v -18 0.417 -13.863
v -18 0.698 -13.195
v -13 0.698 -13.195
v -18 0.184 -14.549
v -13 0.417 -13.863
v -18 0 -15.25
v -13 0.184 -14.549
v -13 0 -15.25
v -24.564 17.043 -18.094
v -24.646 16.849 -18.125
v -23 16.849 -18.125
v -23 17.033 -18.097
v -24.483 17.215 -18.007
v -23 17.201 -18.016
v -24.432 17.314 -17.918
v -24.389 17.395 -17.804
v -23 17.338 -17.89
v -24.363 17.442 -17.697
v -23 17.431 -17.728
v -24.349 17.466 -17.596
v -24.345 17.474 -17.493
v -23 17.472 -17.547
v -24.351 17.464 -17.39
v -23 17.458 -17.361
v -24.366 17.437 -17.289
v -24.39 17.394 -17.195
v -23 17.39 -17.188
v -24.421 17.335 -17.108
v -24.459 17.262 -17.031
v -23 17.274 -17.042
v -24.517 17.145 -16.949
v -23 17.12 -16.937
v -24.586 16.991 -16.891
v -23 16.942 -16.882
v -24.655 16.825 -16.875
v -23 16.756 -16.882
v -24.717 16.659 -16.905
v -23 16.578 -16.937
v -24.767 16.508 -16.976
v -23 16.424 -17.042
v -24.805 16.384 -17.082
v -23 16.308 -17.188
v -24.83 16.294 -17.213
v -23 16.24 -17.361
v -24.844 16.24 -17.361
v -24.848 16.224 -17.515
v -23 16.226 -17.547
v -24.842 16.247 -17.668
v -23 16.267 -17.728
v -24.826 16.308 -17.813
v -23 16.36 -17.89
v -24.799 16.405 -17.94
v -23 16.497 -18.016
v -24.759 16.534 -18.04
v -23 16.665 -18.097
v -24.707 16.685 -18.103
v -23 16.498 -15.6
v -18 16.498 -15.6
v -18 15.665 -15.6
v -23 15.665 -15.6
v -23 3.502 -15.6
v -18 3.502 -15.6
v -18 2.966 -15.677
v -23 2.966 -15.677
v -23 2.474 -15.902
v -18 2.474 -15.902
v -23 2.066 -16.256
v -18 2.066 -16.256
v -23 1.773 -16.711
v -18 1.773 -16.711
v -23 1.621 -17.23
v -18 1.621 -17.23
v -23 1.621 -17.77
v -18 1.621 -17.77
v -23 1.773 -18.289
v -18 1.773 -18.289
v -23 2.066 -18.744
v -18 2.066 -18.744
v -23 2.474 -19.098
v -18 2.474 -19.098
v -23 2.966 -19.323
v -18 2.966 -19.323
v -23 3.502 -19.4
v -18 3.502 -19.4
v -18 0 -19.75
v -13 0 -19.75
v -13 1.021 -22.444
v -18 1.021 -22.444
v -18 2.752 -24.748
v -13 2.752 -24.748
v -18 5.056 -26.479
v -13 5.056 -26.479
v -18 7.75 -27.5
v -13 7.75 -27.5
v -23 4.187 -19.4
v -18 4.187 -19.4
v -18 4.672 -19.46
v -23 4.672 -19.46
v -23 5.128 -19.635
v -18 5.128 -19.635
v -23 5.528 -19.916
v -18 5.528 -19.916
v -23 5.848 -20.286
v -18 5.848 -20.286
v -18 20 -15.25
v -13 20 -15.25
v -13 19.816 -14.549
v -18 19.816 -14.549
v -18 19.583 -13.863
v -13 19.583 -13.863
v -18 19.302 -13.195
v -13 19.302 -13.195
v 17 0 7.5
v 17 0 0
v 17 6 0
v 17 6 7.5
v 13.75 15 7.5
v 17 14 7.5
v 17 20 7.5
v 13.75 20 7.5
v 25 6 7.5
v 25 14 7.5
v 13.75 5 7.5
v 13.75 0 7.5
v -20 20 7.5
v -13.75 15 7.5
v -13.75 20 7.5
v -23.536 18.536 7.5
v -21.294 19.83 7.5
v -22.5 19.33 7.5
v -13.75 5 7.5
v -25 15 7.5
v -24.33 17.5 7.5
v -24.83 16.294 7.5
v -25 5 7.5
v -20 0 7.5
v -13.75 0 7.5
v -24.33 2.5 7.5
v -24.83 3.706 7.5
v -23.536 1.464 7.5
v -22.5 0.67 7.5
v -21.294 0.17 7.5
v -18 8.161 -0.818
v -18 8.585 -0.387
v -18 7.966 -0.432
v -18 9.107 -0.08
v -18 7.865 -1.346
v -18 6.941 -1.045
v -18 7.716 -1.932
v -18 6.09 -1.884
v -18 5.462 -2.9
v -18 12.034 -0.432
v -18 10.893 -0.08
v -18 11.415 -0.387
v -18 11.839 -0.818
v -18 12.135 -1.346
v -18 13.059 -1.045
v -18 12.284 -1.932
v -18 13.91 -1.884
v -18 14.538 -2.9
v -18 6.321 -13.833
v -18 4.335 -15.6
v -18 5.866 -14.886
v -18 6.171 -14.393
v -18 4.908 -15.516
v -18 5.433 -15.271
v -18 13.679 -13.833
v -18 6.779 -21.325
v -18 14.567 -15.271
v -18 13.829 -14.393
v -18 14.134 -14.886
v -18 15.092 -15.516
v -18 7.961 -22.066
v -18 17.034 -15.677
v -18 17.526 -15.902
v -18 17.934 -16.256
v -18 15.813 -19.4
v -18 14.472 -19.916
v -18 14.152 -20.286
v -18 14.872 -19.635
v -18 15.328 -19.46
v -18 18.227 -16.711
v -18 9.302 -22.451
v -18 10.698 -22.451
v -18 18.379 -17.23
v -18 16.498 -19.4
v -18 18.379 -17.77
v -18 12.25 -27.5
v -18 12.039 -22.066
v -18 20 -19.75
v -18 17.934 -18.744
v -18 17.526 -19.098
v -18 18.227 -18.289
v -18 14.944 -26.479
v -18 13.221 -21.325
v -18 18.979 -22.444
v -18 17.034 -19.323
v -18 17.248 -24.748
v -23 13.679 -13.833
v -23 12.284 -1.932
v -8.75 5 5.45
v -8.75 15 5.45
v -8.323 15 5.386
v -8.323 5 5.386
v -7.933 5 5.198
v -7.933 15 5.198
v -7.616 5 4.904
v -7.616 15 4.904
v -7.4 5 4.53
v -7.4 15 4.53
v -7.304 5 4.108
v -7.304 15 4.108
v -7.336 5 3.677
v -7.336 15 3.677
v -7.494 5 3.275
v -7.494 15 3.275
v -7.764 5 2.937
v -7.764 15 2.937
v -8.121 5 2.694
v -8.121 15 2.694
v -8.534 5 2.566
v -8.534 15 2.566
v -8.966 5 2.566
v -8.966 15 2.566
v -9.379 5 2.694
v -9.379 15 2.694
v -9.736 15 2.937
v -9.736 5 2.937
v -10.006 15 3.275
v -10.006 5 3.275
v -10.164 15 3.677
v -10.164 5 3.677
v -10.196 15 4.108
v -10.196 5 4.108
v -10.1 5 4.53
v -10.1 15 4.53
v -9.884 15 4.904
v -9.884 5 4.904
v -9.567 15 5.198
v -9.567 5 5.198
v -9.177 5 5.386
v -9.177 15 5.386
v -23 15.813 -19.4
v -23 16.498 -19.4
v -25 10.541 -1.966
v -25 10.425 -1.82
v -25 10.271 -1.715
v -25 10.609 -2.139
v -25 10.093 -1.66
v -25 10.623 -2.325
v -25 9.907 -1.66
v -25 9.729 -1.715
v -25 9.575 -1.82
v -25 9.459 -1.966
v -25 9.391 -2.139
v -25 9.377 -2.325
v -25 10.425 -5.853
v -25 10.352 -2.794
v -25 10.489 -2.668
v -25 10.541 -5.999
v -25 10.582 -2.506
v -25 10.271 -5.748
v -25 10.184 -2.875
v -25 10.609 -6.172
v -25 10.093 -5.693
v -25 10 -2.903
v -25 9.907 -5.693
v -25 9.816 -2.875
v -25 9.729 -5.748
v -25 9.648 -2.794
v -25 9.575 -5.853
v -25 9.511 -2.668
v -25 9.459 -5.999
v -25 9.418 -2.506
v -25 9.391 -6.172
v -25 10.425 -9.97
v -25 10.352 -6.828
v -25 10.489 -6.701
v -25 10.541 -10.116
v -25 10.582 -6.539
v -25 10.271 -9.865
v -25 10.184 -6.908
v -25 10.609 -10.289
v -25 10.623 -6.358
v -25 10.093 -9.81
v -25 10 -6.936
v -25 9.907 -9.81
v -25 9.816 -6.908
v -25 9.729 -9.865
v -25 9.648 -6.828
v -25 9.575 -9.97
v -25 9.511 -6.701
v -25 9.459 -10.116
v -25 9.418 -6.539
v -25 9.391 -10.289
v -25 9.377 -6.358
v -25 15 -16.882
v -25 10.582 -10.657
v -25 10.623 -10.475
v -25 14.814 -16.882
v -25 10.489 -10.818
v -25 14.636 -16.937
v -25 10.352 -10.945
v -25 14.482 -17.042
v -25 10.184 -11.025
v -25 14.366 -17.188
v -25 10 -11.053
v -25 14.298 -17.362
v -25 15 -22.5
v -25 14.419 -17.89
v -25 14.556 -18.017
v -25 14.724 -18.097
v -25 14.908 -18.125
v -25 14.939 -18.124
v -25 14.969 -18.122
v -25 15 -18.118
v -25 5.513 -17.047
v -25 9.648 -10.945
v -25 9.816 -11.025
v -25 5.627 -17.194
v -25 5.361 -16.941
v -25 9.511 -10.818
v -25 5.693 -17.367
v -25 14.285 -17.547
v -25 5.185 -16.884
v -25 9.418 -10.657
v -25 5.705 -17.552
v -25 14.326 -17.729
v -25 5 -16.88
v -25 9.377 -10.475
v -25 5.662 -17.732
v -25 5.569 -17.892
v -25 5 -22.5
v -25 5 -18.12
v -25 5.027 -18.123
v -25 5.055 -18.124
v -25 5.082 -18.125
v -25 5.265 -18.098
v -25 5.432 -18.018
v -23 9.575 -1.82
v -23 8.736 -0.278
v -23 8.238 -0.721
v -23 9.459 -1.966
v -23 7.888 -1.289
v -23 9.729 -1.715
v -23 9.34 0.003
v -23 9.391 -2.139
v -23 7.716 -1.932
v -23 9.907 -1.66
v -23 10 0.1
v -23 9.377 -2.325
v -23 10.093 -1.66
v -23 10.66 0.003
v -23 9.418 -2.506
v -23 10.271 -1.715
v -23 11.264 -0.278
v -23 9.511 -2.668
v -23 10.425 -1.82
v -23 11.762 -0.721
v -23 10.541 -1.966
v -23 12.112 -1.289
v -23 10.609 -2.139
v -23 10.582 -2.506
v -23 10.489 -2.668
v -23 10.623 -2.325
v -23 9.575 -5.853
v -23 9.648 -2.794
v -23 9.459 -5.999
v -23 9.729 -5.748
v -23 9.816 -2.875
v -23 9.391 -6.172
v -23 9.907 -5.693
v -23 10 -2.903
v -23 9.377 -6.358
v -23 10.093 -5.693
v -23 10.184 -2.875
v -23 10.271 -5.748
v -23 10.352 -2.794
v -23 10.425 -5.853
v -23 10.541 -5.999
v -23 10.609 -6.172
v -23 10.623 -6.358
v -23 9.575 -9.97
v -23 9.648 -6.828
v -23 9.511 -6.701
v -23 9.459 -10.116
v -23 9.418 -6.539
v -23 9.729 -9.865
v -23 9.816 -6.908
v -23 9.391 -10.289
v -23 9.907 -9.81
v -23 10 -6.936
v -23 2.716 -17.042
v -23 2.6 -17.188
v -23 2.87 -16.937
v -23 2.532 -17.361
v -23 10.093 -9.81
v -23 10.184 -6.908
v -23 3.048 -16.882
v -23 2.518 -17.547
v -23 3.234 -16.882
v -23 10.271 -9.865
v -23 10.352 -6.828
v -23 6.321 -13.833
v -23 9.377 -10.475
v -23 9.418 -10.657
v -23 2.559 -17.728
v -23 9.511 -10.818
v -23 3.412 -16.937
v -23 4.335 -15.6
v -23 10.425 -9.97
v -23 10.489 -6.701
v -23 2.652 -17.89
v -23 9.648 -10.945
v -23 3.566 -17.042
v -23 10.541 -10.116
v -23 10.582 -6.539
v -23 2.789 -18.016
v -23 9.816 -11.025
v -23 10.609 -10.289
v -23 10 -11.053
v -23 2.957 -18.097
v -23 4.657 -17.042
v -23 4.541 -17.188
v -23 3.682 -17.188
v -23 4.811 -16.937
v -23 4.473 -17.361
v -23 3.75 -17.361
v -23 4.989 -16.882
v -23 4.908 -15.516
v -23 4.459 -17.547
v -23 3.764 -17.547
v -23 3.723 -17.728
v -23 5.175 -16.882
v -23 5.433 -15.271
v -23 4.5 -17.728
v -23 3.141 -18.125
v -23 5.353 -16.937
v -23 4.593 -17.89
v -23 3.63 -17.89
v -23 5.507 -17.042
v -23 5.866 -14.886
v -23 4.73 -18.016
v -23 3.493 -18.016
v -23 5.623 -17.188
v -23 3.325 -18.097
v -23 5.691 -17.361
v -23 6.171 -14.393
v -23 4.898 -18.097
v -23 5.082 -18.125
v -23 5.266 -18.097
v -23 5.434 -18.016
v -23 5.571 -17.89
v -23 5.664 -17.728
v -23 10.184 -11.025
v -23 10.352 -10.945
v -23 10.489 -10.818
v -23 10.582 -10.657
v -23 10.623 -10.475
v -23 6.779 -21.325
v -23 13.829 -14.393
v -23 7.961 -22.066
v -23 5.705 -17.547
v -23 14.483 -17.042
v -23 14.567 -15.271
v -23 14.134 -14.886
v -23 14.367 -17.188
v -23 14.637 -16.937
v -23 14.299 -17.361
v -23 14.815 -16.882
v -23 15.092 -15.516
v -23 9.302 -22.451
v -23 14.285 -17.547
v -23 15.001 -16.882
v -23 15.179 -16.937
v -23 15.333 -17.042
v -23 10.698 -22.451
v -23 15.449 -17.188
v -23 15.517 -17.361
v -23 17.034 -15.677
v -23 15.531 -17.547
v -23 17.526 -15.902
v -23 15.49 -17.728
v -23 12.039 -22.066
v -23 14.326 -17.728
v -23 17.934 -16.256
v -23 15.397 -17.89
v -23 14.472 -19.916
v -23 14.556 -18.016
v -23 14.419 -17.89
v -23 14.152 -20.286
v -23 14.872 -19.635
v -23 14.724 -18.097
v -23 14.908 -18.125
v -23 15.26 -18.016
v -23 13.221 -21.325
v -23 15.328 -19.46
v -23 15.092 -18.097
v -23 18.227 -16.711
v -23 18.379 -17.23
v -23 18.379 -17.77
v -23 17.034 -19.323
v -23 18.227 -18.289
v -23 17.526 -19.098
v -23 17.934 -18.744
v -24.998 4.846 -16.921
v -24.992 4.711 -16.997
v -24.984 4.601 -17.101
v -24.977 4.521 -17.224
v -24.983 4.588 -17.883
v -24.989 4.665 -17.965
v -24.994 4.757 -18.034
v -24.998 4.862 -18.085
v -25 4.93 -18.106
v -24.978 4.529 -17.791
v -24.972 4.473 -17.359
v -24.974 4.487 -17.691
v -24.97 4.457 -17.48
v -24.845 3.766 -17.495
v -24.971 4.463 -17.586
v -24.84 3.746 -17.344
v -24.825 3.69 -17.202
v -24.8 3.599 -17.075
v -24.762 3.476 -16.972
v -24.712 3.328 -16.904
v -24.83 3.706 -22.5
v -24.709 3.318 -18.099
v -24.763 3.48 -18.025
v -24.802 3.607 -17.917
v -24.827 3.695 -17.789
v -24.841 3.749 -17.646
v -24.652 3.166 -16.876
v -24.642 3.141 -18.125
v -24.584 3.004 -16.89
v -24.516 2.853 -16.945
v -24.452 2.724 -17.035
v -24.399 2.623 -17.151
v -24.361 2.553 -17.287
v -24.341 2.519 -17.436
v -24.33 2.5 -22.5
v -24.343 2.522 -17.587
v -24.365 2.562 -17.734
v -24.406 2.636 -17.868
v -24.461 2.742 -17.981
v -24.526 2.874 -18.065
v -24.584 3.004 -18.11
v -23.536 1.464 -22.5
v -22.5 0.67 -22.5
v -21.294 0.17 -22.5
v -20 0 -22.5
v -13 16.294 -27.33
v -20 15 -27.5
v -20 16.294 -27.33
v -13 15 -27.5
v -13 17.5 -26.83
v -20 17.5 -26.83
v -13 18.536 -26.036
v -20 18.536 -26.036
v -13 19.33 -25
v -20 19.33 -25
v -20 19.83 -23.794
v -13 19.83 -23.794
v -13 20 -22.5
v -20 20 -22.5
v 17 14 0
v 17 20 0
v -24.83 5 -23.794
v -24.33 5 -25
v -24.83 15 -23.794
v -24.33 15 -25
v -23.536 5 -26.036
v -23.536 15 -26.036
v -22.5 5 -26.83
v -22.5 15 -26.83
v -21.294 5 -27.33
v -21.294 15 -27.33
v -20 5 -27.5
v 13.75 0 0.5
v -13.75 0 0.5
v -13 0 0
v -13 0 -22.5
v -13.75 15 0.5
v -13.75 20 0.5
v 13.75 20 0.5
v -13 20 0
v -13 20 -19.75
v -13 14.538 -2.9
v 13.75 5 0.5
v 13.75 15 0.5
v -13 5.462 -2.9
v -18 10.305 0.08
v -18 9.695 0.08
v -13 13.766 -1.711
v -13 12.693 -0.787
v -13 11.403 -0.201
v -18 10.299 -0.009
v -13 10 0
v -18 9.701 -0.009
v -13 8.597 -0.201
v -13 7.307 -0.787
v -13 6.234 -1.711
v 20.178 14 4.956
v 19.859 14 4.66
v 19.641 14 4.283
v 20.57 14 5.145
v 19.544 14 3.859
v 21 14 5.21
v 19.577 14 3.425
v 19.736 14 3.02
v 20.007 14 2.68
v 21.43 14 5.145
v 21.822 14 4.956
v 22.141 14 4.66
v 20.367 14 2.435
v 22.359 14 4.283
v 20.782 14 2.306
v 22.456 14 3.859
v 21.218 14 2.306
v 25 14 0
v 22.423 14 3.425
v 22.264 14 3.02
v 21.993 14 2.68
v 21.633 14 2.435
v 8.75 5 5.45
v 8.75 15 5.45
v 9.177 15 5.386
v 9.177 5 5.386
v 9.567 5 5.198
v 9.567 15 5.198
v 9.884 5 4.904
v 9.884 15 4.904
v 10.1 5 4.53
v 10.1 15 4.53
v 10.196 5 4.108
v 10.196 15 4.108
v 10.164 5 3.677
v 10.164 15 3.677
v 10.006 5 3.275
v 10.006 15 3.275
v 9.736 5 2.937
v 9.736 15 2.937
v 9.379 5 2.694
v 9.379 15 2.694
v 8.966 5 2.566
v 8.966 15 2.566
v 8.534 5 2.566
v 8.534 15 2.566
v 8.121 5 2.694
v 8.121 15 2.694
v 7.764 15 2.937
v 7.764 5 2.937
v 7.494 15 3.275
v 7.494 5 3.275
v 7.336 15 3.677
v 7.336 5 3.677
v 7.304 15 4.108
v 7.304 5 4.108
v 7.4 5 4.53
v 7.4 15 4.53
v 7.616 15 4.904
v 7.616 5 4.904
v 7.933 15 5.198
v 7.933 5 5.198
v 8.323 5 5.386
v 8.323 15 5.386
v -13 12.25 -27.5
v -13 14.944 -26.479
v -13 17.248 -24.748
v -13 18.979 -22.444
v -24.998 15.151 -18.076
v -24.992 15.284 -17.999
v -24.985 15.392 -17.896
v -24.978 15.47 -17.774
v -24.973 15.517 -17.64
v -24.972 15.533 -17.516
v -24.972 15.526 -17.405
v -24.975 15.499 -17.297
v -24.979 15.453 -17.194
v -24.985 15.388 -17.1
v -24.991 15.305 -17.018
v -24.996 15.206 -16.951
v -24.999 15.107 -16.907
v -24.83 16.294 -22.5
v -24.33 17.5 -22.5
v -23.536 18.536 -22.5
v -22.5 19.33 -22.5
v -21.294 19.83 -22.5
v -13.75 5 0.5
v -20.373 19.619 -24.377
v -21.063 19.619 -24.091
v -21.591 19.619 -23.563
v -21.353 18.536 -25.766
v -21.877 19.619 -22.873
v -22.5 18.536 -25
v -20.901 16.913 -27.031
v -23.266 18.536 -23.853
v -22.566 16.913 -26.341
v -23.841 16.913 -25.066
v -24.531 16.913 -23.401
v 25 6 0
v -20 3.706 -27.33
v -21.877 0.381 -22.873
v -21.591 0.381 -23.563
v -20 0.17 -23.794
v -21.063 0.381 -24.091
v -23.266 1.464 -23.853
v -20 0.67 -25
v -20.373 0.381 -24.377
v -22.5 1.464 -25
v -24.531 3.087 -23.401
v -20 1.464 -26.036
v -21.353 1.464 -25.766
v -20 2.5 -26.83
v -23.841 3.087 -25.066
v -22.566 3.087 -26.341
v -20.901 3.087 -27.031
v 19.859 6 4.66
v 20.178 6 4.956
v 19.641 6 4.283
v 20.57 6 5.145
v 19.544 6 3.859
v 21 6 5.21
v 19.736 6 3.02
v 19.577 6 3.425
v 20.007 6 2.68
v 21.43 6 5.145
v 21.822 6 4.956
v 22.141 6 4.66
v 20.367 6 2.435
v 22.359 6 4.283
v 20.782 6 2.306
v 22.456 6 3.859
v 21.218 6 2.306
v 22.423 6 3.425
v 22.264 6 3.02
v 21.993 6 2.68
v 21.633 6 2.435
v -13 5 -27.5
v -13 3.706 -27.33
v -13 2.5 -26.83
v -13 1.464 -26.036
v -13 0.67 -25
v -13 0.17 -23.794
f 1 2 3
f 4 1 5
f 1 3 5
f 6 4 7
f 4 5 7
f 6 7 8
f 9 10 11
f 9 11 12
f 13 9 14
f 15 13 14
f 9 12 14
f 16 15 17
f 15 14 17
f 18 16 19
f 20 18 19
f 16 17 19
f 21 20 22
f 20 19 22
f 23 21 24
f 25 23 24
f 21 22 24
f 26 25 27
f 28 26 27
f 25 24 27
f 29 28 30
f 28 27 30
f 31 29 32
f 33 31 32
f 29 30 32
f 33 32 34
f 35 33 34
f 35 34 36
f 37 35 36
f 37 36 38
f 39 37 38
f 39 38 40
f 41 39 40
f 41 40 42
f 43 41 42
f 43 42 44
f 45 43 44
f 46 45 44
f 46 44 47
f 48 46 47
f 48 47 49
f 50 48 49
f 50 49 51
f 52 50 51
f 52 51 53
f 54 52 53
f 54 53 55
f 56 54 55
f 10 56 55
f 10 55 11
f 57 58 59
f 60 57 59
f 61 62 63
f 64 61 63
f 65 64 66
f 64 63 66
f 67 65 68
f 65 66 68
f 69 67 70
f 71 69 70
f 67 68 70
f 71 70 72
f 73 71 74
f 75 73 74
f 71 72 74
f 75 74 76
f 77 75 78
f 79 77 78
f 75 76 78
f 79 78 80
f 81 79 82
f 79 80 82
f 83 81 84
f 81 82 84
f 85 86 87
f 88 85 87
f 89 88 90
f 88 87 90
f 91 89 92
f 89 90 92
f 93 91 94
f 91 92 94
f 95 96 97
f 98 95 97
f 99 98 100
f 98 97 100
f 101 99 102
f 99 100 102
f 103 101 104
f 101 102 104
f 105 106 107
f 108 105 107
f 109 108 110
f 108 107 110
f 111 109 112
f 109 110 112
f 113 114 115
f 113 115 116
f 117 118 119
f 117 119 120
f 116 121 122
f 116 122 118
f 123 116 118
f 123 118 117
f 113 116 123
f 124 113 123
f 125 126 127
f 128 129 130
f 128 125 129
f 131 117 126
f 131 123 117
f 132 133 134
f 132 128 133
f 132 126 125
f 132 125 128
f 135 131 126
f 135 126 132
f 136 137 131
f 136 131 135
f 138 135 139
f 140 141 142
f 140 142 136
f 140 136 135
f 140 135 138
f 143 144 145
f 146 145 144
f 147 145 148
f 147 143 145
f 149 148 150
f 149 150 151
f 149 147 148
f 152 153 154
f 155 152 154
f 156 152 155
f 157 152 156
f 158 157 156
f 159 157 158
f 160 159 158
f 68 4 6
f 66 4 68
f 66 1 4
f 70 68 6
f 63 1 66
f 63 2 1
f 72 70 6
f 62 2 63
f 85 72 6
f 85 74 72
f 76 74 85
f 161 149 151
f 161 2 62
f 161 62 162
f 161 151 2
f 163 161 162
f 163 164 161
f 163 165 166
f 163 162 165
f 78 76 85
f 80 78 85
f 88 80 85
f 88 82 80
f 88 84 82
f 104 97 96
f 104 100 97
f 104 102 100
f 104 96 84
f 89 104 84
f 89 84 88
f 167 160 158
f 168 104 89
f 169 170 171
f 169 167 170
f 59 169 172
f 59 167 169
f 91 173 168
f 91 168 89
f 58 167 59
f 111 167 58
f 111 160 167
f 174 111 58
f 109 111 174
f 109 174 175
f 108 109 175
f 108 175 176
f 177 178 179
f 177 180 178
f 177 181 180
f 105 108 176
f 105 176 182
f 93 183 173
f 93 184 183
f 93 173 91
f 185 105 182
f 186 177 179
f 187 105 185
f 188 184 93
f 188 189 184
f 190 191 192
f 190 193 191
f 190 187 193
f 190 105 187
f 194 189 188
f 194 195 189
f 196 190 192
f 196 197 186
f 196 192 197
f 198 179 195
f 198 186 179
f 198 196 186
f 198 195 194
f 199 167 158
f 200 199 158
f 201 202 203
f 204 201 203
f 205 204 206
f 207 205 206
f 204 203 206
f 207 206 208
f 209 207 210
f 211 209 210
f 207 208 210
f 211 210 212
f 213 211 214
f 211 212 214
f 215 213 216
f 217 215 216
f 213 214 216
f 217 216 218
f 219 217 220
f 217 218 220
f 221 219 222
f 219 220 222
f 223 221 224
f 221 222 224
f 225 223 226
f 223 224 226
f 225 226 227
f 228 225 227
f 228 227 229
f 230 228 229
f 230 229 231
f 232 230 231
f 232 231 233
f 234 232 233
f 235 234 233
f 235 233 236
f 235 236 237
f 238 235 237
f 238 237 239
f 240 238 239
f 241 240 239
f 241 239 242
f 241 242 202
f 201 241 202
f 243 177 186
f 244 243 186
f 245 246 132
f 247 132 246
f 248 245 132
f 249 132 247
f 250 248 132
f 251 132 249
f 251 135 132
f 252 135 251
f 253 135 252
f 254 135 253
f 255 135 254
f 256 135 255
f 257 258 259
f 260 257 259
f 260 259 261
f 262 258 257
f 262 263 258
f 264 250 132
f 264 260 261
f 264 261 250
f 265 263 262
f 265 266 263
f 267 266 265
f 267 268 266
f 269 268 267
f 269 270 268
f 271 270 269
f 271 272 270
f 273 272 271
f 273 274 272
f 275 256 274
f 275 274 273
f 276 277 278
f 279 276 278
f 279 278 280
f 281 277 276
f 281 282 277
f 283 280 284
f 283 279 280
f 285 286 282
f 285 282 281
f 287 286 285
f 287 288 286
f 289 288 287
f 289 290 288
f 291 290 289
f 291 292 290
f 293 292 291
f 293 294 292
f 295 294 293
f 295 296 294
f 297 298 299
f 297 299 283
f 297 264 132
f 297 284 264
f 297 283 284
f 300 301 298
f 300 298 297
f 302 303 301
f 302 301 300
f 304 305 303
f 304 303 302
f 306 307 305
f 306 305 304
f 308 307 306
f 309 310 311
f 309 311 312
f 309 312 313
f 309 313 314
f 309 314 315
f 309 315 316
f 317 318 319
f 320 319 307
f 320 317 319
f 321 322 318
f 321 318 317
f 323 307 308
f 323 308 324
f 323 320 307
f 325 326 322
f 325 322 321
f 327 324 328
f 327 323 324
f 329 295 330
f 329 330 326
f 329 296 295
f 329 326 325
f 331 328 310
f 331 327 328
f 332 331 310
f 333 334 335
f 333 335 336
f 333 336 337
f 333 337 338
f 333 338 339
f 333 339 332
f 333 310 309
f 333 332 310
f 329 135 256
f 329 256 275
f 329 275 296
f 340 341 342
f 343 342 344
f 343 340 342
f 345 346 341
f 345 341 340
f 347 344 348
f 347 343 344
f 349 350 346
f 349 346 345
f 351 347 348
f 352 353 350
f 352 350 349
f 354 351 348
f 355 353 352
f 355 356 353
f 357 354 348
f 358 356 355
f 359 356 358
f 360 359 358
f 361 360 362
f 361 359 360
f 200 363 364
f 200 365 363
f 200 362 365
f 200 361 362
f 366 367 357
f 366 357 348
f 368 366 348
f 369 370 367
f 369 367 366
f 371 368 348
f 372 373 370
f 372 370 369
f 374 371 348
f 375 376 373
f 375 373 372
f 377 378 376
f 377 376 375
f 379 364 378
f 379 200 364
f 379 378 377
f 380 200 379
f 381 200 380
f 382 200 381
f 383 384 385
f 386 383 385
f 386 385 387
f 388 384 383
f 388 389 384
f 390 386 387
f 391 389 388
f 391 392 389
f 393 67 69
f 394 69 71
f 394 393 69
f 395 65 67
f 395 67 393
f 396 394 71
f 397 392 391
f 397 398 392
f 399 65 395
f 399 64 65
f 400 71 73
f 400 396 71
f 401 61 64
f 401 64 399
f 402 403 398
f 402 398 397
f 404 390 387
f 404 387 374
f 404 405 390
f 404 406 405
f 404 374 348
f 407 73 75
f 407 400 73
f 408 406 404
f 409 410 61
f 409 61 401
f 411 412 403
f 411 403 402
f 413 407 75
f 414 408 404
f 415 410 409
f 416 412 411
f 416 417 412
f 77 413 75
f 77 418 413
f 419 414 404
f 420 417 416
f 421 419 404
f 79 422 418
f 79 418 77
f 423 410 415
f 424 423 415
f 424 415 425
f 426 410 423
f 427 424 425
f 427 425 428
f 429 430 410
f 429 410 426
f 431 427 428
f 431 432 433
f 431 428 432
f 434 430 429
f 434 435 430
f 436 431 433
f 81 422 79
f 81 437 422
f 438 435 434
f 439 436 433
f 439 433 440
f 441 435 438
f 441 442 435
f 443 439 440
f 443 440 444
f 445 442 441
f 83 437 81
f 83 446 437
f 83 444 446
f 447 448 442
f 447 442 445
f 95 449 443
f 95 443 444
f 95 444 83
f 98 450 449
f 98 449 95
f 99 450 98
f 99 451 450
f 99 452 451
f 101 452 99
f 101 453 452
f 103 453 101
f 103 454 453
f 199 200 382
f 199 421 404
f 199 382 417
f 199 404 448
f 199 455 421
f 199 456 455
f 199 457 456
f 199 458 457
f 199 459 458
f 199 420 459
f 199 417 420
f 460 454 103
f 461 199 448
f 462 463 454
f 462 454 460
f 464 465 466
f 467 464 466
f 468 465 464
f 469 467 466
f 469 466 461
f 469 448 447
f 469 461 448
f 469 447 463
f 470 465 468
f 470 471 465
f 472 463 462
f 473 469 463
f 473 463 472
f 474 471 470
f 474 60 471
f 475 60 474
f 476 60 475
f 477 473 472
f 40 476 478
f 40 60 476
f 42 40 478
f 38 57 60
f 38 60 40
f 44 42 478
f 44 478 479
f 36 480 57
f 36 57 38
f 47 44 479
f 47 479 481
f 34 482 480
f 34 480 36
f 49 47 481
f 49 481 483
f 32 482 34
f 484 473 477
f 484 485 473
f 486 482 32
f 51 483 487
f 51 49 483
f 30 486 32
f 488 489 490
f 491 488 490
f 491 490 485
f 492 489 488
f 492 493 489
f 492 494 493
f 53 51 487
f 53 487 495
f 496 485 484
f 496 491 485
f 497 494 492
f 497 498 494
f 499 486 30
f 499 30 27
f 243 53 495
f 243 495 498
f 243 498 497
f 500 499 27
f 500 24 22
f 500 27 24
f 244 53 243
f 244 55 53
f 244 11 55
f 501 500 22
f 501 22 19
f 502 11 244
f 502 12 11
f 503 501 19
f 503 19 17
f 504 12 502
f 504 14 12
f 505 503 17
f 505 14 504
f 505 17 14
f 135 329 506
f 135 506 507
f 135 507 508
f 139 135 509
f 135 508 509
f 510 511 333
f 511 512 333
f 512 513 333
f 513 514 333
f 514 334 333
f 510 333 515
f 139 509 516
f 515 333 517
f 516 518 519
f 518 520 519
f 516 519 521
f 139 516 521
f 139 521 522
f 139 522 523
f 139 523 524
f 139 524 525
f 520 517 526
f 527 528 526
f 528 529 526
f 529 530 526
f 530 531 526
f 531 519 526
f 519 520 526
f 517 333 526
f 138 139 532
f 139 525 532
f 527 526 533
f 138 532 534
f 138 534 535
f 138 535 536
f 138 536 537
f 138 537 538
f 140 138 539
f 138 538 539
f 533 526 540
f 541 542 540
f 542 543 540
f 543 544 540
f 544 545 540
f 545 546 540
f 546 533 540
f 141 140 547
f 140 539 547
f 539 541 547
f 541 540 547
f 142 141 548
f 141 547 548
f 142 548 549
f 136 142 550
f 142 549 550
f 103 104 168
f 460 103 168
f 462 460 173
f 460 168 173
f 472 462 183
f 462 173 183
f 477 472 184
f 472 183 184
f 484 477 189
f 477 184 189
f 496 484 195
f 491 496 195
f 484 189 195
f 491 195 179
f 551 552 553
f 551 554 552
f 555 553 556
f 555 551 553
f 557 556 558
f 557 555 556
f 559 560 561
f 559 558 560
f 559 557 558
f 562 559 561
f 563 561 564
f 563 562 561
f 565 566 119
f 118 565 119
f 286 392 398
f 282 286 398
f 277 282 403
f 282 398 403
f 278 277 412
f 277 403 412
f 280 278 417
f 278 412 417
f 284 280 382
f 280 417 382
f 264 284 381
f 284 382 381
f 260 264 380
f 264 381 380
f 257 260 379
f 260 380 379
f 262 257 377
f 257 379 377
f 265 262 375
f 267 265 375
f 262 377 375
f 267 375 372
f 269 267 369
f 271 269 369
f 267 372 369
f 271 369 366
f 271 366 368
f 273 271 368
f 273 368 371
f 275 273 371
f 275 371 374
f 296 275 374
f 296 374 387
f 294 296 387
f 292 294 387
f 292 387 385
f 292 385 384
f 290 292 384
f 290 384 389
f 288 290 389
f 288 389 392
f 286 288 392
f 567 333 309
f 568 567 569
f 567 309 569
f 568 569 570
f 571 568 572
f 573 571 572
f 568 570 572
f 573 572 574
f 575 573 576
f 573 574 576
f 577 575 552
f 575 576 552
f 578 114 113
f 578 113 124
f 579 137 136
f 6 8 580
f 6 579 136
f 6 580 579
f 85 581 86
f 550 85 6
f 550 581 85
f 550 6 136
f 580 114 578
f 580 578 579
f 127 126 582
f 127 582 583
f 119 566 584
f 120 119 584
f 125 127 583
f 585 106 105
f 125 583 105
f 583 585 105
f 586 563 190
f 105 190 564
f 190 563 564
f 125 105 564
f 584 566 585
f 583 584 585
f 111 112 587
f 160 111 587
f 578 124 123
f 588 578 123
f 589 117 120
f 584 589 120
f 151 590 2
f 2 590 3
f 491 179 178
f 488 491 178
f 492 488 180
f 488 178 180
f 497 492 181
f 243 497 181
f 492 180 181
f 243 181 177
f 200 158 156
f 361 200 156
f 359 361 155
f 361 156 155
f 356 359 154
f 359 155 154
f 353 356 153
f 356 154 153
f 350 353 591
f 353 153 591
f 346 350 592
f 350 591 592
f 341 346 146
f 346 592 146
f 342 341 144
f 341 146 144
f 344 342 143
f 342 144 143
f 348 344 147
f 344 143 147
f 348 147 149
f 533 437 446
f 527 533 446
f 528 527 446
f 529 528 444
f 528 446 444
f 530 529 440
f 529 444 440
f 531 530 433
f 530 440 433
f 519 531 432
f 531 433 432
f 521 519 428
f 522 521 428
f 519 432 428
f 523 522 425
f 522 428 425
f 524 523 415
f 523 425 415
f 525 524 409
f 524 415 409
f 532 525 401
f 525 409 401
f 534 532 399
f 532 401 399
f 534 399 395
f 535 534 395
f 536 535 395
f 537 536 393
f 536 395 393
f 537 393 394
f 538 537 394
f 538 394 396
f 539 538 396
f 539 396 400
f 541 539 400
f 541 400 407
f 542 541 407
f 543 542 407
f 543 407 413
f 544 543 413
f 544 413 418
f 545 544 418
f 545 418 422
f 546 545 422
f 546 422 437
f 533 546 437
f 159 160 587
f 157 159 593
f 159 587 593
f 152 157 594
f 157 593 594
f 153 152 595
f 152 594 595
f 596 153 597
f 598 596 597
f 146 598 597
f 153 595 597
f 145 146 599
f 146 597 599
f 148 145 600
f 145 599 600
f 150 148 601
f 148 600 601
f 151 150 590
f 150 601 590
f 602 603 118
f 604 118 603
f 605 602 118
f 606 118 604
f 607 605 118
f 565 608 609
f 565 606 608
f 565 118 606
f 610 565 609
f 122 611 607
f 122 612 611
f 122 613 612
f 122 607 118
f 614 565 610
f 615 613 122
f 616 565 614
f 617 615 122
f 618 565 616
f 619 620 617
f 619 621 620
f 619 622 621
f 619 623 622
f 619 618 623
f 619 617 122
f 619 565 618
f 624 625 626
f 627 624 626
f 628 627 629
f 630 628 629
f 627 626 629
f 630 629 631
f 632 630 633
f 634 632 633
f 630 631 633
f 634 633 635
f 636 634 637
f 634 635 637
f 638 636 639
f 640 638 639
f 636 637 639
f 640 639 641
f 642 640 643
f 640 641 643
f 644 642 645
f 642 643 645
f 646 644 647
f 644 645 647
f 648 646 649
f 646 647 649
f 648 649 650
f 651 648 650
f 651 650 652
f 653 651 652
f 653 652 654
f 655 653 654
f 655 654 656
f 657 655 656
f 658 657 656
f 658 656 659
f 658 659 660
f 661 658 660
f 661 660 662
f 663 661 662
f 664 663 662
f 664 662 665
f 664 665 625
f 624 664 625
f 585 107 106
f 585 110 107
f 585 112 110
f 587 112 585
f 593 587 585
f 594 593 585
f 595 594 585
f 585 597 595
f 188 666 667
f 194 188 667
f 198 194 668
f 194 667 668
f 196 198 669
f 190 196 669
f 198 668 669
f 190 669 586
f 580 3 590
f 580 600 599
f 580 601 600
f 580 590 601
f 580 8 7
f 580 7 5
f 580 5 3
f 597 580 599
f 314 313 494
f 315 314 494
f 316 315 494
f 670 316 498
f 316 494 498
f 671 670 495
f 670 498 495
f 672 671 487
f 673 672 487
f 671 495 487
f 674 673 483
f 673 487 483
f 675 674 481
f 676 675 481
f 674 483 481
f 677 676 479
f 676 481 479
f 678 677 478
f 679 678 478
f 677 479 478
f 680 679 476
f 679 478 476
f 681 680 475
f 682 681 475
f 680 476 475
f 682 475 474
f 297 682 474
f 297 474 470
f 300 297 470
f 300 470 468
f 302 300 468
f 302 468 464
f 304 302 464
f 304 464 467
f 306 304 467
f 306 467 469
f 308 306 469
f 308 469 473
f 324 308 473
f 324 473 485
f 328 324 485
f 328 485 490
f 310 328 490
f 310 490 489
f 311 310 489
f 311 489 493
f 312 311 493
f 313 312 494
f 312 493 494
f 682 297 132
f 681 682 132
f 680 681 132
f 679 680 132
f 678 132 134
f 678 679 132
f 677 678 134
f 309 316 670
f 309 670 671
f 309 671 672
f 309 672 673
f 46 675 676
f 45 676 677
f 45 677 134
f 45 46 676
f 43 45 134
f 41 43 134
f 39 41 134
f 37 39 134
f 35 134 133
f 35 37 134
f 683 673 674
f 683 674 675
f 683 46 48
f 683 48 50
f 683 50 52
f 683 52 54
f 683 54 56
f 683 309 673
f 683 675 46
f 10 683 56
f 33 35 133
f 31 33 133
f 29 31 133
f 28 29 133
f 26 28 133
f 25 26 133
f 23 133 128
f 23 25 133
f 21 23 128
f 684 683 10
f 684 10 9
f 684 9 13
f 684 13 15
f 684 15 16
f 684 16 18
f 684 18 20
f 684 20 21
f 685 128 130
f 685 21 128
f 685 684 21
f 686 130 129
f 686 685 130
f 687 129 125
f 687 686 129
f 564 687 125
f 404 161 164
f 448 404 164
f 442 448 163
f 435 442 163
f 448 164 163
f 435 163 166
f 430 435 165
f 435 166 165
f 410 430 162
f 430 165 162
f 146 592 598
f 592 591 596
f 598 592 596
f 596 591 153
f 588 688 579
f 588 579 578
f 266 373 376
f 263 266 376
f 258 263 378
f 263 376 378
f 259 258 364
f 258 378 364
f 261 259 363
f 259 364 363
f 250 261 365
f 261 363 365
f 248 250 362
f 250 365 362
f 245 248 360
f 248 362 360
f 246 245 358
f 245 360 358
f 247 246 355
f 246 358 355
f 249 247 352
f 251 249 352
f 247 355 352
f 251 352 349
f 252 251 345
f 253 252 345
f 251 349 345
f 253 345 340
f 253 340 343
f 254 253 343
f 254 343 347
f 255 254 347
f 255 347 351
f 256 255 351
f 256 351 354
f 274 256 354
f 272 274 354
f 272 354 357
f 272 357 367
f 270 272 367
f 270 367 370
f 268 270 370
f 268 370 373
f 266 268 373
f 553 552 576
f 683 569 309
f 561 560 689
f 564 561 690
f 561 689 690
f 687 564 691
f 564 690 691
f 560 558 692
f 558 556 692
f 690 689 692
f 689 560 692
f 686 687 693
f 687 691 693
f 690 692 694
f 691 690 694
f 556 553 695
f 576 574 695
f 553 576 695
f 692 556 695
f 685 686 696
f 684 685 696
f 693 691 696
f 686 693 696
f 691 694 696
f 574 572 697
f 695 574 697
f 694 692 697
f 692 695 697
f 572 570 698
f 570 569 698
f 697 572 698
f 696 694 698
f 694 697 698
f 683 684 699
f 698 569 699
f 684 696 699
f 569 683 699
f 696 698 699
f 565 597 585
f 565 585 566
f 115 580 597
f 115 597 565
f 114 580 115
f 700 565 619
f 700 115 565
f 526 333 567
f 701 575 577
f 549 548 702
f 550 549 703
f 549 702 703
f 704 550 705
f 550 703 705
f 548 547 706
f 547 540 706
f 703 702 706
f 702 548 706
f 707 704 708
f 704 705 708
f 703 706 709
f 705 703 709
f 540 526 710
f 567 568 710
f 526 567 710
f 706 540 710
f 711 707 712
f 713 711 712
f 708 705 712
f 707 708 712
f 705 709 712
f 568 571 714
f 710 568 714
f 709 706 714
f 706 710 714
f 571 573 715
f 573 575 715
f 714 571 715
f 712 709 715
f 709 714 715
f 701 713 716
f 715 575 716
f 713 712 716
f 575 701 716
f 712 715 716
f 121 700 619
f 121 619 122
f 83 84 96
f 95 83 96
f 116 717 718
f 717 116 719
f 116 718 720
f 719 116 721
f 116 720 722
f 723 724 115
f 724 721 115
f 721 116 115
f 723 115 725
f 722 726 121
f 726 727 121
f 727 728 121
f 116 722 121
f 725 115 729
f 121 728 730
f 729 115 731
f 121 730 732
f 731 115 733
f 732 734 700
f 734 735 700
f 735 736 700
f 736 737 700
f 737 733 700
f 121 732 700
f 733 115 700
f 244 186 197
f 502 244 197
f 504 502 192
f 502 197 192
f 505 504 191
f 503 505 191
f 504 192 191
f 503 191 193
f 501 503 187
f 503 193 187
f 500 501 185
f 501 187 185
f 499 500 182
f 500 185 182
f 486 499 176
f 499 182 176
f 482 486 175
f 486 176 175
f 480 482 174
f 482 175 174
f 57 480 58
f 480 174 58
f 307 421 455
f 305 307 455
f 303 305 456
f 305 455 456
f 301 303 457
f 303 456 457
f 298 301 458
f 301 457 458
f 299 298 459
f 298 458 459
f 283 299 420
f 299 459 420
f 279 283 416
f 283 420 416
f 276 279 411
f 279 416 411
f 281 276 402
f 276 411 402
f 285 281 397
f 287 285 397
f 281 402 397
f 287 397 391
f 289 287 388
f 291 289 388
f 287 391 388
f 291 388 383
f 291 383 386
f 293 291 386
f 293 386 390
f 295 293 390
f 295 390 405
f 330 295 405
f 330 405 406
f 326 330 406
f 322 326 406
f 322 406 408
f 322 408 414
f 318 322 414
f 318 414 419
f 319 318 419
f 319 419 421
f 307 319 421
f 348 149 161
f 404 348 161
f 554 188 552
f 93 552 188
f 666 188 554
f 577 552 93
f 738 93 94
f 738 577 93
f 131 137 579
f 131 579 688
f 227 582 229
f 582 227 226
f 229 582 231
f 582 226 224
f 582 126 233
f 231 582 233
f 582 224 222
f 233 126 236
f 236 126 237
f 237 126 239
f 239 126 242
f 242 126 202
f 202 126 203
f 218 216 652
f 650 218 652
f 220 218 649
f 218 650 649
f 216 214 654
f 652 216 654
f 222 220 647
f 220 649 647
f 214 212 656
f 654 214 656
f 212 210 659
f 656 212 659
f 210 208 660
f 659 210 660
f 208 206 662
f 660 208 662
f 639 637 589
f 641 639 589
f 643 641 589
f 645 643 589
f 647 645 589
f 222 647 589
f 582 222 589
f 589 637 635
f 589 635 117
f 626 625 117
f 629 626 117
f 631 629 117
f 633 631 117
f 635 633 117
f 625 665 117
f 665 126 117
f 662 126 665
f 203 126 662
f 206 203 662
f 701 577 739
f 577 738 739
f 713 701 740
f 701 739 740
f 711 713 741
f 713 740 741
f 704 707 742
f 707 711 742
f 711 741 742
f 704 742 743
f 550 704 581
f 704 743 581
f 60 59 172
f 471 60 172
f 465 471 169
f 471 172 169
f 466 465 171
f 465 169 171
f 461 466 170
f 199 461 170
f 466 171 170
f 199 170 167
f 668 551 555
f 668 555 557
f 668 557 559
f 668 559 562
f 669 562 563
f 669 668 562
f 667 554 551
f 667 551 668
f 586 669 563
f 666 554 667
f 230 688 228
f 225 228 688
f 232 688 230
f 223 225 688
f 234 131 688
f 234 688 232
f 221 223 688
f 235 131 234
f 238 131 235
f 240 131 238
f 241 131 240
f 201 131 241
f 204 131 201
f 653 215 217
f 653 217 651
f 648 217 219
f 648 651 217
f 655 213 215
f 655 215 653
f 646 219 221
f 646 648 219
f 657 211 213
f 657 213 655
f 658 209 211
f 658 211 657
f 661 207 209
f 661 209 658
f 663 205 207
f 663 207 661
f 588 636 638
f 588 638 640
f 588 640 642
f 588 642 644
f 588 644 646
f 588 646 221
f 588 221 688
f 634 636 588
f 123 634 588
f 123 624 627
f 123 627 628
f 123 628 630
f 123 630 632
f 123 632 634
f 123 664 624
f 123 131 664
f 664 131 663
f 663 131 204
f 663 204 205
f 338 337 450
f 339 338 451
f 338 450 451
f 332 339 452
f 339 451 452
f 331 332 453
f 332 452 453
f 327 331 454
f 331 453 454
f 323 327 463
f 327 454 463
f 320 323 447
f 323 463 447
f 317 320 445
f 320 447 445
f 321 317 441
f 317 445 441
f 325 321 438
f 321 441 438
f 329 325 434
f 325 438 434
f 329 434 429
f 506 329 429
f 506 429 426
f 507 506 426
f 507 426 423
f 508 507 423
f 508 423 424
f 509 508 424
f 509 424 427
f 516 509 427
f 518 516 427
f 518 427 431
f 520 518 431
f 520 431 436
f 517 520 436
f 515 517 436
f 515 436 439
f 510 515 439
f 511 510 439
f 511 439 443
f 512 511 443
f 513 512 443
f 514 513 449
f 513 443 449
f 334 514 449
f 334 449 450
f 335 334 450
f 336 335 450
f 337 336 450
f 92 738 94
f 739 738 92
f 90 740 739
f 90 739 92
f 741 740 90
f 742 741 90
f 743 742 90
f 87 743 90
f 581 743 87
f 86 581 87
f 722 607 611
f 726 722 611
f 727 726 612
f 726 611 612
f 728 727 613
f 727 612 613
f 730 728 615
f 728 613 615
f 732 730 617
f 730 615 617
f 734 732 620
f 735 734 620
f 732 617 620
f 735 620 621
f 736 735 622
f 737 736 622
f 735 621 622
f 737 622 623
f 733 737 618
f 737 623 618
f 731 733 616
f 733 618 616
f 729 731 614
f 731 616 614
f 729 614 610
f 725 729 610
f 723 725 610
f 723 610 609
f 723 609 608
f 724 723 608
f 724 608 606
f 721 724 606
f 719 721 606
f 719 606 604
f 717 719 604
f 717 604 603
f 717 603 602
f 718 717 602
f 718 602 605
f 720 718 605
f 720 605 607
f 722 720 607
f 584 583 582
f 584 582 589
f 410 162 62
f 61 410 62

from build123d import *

# Parameters (mm, degrees)
EXTRUDE_1_DEPTH      = 20
FILLET_1_R           = 5
SKETCH_2_R           = 8
CUT_EXTRUDE_1_DEPTH  = 5
SKETCH_3_R           = 6
CUT_EXTRUDE_2_DEPTH  = 1
CUT_EXTRUDE_3_DEPTH  = 5
CUT_EXTRUDE_4_DEPTH  = 5
SKETCH_6_R           = 0.625
CUT_EXTRUDE_5_DEPTH  = 4
SKETCH_7_W           = 27.5
SKETCH_7_H           = 5
CUT_EXTRUDE_6_DEPTH  = 7
SKETCH_8_R           = 1.45
CUT_EXTRUDE_7_DEPTH  = 12
CUT_EXTRUDE_8_DEPTH  = 6
CUT_EXTRUDE_START    = -20
CUT_EXTRUDE_9_DEPTH  = 6
SKETCH_13_W          = 12
SKETCH_13_H          = 27.5
CUT_EXTRUDE_10_DEPTH = 11
SKETCH_14_R          = 1.46
CUT_EXTRUDE_11_DEPTH = 11


with BuildPart() as part:
    # Эскиз1 → Бобышка-Вытянуть1 (new body)
    with BuildSketch(Plane(origin=(0, 0, 0), x_dir=(1, 0, 0), z_dir=(0, 1, 0))):
        Polygon((-13, 27.5), (-13, 0), (13, 0), (13, 27.5), (25, 27.5), (25, -7.5), (-25, -7.5), (-25, 27.5), align=None)
    extrude(amount=EXTRUDE_1_DEPTH)

    # Скругление1
    fillet_1_edges = [part.edges().sort_by_distance(p)[0] for p in [
        (19, 0, -27.5),
        (25, 10, -27.5),
        (-25, 10, -27.5),
        (-19, 20, -27.5),
        (-25, 20, -10),
        (25, 20, -10),
        (19, 20, -27.5),
        (25, 0, -10),
        (-25, 0, -10),
        (-19, 0, -27.5),
    ]]
    fillet(fillet_1_edges, radius=FILLET_1_R)

    # Эскиз2 → Вырез-Вытянуть1 (cut)
    with BuildSketch(Plane.ZY.offset(-13)):
        with Locations((-17.5, 10)):
            Circle(SKETCH_2_R)
    extrude(amount=-CUT_EXTRUDE_1_DEPTH, mode=Mode.SUBTRACT)

    # Эскиз3 → Вырез-Вытянуть2 (cut)
    with BuildSketch(Plane.ZY.offset(-18)):
        with Locations((-17.5, 10)):
            Circle(SKETCH_3_R)
    extrude(amount=-CUT_EXTRUDE_2_DEPTH, mode=Mode.SUBTRACT)

    # Эскиз4 → Вырез-Вытянуть3 (cut)
    with BuildSketch(Plane(origin=(-13, 0, 0), x_dir=(0, 0, -1), z_dir=(1, 0, 0))):
        with BuildLine():
            Line((13.195, 19.30212207), (2.9, 14.537620522))
            ThreePointArc((2.9, 14.537620522), (0, 10), (2.9, 5.462379478))
            Line((2.9, 5.462379478), (13.195, 0.69787793))
            ThreePointArc((13.195, 0.69787793), (27.75, 10), (13.195, 19.30212207))
        make_face()
    extrude(amount=-CUT_EXTRUDE_3_DEPTH, mode=Mode.SUBTRACT)

    # Эскиз5 → Вырез-Вытянуть4 (cut)
    with BuildSketch(Plane(origin=(-18, 0, 0), x_dir=(0, 0, -1), z_dir=(1, 0, 0))):
        with BuildLine():
            Line((19.4, 15.812916652), (19.4, 16.49838717))
            ThreePointArc((19.4, 16.49838717), (17.499999842, 18.39838717), (15.6, 16.498386854))
            Line((15.6, 16.498386854), (15.6, 15.665366642))
            ThreePointArc((15.6, 15.665366642), (15.094249889, 14.335999398), (13.832782732, 13.678959785))
            Line((13.832782732, 13.678959785), (1.932299859, 12.284367885))
            ThreePointArc((1.932299859, 12.284367885), (-0.1, 10), (1.932299859, 7.715632115))
            Line((1.932299859, 7.715632115), (13.832782732, 6.321040215))
            ThreePointArc((13.832782732, 6.321040215), (15.094249889, 5.664000602), (15.6, 4.334633358))
            Line((15.6, 4.334633358), (15.6, 3.501613146))
            ThreePointArc((15.6, 3.501613146), (17.5, 1.601613146), (19.4, 3.501613146))
            Line((19.4, 3.501613146), (19.4, 4.187083665))
            ThreePointArc((19.4, 4.187083665), (19.635266181, 5.128207436), (20.285714286, 5.847916677))
            ThreePointArc((20.285714286, 5.847916677), (22.5, 10), (20.285714286, 14.152083323))
            ThreePointArc((20.285714286, 14.152083323), (19.635266107, 14.871792704), (19.4, 15.812916652))
        make_face()
    extrude(amount=-CUT_EXTRUDE_4_DEPTH, mode=Mode.SUBTRACT)

    # Эскиз6 → Вырез-Вытянуть5 (cut)
    with BuildSketch(Plane(origin=(-23, 0, 0), x_dir=(0, 0, -1), z_dir=(1, 0, 0))):
        with Locations((2.278018202, 10)):
            Circle(SKETCH_6_R)
        with Locations((6.311115384, 10)):
            Circle(SKETCH_6_R)
        with Locations((10.428235425, 10)):
            Circle(SKETCH_6_R)
        with Locations((17.5, 14.907931149)):
            Circle(SKETCH_6_R)
        with Locations((17.5, 16.848859168)):
            Circle(SKETCH_6_R)
        with Locations((17.5, 5.082068851)):
            Circle(SKETCH_6_R)
        with Locations((17.5, 3.141140832)):
            Circle(SKETCH_6_R)
    extrude(amount=-CUT_EXTRUDE_5_DEPTH, mode=Mode.SUBTRACT)

    # Эскиз7 → Вырез-Вытянуть6 (cut)
    with BuildSketch(Plane.XY.offset(7.5)):
        with Locations((0, 17.5)):
            Rectangle(SKETCH_7_W, SKETCH_7_H)
        with Locations((0, 2.5)):
            Rectangle(SKETCH_7_W, SKETCH_7_H)
    extrude(amount=-CUT_EXTRUDE_6_DEPTH, mode=Mode.SUBTRACT)

    # Эскиз8 → Вырез-Вытянуть7 (cut)
    with BuildSketch(Plane(origin=(0, 15, 0), x_dir=(1, 0, 0), z_dir=(0, 1, 0))):
        with Locations(Location((-8.75, -4, 0), (0, 0, 270))):
            Circle(SKETCH_8_R)
        with Locations(Location((8.75, -4, 0), (0, 0, 270))):
            Circle(SKETCH_8_R)
    extrude(amount=-CUT_EXTRUDE_7_DEPTH, mode=Mode.SUBTRACT)

    # Эскиз11 → Вырез-Вытянуть8 (cut)
    with BuildSketch(Plane(origin=(0, 20, 0), x_dir=(1, 0, 0), z_dir=(0, 1, 0))):
        Polygon((13, 27.5), (13, 0), (17, 0), (17, -7.5), (25, -7.5), (25, 27.5), align=None)
    extrude(amount=-CUT_EXTRUDE_8_DEPTH, mode=Mode.SUBTRACT)

    # Эскиз11<2> → Вырез-Вытянуть9 (cut)
    with BuildSketch(Plane(origin=(0, 20, 0), x_dir=(1, 0, 0), z_dir=(0, 1, 0)).offset(CUT_EXTRUDE_START)):
        Polygon((13, 27.5), (13, 0), (17, 0), (17, -7.5), (25, -7.5), (25, 27.5), align=None)
    extrude(amount=CUT_EXTRUDE_9_DEPTH, mode=Mode.SUBTRACT)

    # Эскиз13 → Вырез-Вытянуть10 (cut)
    with BuildSketch(Plane(origin=(0, 14, 0), x_dir=(1, 0, 0), z_dir=(0, 1, 0))):
        with Locations((19, 13.75)):
            Rectangle(SKETCH_13_W, SKETCH_13_H)
    extrude(amount=-CUT_EXTRUDE_10_DEPTH, mode=Mode.SUBTRACT)

    # Эскиз14 → Вырез-Вытянуть11 (cut)
    with BuildSketch(Plane(origin=(0, 14, 0), x_dir=(1, 0, 0), z_dir=(0, 1, 0))):
        with Locations(Location((21, -3.75, 0), (0, 0, 270))):
            Circle(SKETCH_14_R)
    extrude(amount=-CUT_EXTRUDE_11_DEPTH, mode=Mode.SUBTRACT)


solid = part.part
